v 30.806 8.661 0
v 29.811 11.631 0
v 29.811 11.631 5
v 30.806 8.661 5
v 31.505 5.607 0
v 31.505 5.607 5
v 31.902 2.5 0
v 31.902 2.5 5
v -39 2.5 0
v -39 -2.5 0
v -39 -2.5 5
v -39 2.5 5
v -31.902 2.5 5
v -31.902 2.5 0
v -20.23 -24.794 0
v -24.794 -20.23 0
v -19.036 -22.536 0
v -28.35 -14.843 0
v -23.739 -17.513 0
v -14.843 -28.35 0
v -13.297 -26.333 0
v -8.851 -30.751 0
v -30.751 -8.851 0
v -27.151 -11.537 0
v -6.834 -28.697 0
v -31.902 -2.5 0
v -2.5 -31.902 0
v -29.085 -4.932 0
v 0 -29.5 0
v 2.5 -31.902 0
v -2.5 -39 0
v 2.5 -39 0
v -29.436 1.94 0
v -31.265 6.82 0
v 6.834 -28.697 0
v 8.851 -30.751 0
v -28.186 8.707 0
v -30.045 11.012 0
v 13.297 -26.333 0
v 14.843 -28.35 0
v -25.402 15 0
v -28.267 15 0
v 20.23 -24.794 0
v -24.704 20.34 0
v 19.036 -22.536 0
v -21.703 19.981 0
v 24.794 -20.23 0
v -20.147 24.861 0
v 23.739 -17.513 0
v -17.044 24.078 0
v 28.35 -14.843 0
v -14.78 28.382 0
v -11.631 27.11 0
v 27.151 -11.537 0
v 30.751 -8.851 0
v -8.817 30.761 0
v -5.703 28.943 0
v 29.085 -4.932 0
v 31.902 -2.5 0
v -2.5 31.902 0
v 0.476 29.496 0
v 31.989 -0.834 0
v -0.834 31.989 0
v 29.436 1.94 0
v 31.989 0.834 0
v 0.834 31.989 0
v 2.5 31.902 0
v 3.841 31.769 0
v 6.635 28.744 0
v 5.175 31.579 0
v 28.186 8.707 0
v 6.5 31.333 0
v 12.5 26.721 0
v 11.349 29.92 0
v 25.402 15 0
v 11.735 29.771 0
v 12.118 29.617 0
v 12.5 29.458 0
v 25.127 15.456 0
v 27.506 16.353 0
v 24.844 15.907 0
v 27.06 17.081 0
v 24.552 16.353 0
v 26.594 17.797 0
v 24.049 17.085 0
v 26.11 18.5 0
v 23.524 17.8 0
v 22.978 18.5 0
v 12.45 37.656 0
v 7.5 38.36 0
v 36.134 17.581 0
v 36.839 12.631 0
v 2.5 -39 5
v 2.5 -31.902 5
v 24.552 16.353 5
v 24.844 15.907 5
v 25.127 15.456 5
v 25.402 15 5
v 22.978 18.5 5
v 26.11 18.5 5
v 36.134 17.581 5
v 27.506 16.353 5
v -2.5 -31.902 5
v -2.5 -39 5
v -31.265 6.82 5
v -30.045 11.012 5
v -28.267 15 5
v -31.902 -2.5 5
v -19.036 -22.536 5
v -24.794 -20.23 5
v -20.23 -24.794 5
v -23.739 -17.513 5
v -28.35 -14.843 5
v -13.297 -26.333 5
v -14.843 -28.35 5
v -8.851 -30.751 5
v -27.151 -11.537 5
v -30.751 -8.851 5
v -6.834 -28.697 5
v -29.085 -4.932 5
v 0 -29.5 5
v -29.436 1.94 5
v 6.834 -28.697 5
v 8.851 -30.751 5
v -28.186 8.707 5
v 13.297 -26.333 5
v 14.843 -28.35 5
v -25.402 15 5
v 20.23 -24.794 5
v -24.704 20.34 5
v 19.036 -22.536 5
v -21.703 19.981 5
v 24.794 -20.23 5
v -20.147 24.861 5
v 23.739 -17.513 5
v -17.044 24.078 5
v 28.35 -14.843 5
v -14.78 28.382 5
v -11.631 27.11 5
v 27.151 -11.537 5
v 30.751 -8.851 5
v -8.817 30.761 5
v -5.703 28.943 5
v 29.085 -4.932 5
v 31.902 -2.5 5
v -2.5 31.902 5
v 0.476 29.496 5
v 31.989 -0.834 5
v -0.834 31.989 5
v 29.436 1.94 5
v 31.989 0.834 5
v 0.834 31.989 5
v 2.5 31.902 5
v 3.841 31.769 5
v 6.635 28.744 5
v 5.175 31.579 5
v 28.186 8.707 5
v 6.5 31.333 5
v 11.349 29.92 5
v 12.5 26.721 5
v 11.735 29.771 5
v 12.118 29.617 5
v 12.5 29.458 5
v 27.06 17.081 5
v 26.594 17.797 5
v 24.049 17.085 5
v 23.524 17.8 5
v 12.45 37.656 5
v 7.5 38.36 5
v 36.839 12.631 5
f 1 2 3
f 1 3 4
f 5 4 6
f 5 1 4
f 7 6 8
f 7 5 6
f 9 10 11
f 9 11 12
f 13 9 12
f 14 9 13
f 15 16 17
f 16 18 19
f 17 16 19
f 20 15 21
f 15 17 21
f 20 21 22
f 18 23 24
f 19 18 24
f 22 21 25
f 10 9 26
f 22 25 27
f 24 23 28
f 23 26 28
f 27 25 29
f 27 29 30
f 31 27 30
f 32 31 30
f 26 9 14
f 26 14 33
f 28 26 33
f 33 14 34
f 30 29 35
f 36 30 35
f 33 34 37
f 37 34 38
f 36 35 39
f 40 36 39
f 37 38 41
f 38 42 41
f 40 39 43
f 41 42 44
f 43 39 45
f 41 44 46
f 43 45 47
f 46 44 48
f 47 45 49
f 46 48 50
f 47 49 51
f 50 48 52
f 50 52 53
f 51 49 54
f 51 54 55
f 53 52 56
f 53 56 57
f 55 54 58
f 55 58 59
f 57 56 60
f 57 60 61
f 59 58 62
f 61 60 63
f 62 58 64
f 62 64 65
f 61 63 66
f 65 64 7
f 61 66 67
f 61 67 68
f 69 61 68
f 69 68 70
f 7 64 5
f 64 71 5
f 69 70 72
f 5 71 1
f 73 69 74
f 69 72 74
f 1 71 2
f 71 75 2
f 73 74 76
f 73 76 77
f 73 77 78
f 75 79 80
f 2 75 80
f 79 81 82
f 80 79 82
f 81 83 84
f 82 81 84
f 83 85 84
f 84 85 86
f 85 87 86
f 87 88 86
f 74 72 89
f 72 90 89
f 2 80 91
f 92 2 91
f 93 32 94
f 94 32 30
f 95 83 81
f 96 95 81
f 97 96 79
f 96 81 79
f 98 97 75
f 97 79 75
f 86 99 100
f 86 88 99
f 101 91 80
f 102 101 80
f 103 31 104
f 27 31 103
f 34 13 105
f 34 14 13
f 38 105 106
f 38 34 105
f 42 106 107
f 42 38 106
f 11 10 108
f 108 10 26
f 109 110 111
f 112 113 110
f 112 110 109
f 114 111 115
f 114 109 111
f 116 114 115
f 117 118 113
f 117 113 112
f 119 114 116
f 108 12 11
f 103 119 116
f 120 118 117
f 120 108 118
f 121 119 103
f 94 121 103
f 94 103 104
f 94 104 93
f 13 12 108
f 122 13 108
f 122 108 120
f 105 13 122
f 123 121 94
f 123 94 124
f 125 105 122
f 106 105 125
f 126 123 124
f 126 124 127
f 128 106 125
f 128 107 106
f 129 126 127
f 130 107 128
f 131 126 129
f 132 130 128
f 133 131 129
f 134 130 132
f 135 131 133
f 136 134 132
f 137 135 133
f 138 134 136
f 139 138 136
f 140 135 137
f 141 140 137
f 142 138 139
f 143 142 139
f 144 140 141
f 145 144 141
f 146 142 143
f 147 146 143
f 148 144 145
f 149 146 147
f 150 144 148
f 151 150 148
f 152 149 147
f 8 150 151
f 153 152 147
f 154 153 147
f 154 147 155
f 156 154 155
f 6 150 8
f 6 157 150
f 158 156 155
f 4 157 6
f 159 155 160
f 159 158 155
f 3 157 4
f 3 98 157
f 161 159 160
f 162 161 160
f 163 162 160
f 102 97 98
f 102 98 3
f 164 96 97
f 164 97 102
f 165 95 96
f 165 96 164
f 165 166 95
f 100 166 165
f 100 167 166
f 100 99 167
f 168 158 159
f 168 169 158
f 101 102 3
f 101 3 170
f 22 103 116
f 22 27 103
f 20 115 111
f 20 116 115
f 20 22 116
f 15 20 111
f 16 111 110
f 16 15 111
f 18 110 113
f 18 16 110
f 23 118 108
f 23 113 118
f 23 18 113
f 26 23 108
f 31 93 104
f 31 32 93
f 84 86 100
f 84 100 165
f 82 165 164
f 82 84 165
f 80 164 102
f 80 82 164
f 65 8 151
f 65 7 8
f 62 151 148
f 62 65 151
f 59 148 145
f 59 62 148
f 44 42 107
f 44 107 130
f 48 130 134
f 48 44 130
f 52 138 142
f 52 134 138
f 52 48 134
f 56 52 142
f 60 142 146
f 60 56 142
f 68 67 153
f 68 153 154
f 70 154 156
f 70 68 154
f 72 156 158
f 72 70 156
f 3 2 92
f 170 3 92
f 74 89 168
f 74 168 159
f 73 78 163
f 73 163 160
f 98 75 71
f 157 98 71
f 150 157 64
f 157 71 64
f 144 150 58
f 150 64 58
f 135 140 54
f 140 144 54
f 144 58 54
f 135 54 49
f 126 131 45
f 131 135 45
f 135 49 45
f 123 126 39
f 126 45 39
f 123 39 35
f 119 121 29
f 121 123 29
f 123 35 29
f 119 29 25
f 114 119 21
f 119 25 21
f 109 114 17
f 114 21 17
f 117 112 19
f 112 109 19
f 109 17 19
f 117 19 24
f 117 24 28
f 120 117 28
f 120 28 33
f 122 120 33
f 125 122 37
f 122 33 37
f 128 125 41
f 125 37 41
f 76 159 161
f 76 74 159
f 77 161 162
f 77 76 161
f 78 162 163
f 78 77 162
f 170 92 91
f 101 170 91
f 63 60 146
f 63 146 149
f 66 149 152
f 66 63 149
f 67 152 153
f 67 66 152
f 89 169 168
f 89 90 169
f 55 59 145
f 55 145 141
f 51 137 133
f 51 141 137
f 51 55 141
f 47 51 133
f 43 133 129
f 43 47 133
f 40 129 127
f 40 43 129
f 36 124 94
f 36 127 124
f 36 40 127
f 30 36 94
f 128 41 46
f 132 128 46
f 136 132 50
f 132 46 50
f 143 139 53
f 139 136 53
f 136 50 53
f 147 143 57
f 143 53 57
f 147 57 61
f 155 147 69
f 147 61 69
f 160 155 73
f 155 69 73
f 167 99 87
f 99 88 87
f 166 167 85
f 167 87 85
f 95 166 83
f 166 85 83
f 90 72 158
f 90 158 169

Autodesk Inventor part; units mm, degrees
ref_plane "YZ Plane" through (0, 0, 0) normal (1, 0, 0) x (0, 1, 0)
ref_plane "XZ Plane" through (0, 0, 0) normal (0, 1, 0) x (-1, 0, 0)
ref_plane "XY Plane" through (0, 0, 0) normal (0, 0, 1) x (1, 0, 0)
sketch "Sketch1" plane through (0, 0, 0) normal (0, 0, 1) x (1, 0, 0)
  arc A0 (-25.4018, 15) -> (25.4018, 15) centre (0, 0) ccw
  line L0 (-39, 2.5) -> (-32, 2.5)
  line L1 (-32, -2.5) -> (-39, -2.5)
  line L2 (-39, -2.5) -> (-39, 2.5)
  line L3 (-32, 2.5) -> (-31.9022, 2.5)
  line L4 (-32, -2.5) -> (-31.9022, -2.5)
  line L5 (2.5, -32) -> (2.5, -39)
  line L6 (2.5, -39) -> (-2.5, -39)
  line L7 (-2.5, -39) -> (-2.5, -32)
  line L8 (-2.5, -32) -> (-2.5, -31.9022)
  line L9 (2.5, -32) -> (2.5, -31.9022)
  line L10 (32, 2.5) -> (31.9022, 2.5)
  line L11 (32, -2.5) -> (31.9022, -2.5)
  arc A1 (-28.2666, 15) -> (-31.9022, 2.5) centre (0, 0) ccw
  arc A2 (-31.9022, -2.5) -> (-2.5, -31.9022) centre (0, 0) ccw
  arc A3 (2.5, -31.9022) -> (31.9022, -2.5) centre (0, 0) ccw
  arc A4 (31.9022, 2.5) -> (28.2666, 15) centre (0, 0) ccw
  arc A5 (12.5, 26.7208) -> (25.4018, 15) centre (0, 0) ccw
  line L12 (12.5, 29.4576) -> (12.5, 26.7208)
  arc A6 (-2.5, 31.9022) -> (-31.9022, 2.5) centre (0, 0) ccw
  arc A7 (-31.9022, -2.5) -> (-2.5, -31.9022) centre (0, 0) ccw
  arc A8 (2.5, -31.9022) -> (31.9022, -2.5) centre (0, 0) ccw
  arc A9 (31.9022, 2.5) -> (28.2666, 15) centre (0, 0) ccw
  line L13 (6.5, 31.3329) -> (7.5001, 38.3601)
  line L14 (6.5, 31.3329) -> (13.598, 31.3329) construction
  line L15 (7.5001, 38.3601) -> (12.4502, 37.6556)
  line L16 (12.4502, 37.6556) -> (11.3493, 29.9198)
  arc A10 (12.5, 29.4576) -> (11.3493, 29.9198) centre (0, 0) ccw
  arc A11 (12.5, 29.4576) -> (11.3493, 29.9198) centre (0, 0) ccw
  arc A12 (6.5, 31.3329) -> (2.5, 31.9022) centre (0, 0) ccw
  arc A13 (6.5, 31.3329) -> (-31.9022, 2.5) centre (0, 0) ccw
  arc A14 (31.9022, 2.5) -> (28.2666, 15) centre (0, 0) ccw
  arc A15 (-31.9022, -2.5) -> (-2.5, -31.9022) centre (0, 0) ccw
  arc A16 (2.5, -31.9022) -> (31.9022, -2.5) centre (0, 0) ccw
  line L17 (31.9022, 2.5) -> (41.0332, 2.5) construction
  line L18 (29.8114, 11.631) -> (36.8386, 12.6311)
  line L19 (29.8114, 11.631) -> (36.9094, 11.631) construction
  line L20 (36.8386, 12.6311) -> (41.8386, 12.6311) construction
  line L21 (36.8386, 12.6311) -> (36.1341, 17.5812)
  line L22 (36.8386, 12.6311) -> (41.8386, 12.6311) construction
  line L23 (36.1341, 17.5812) -> (27.5058, 16.3533)
  line L24 (36.1341, 17.5812) -> (44.8493, 17.5812) construction
  arc A17 (12.5, 26.7208) -> (24.5524, 16.3533) centre (0, 0) ccw
  arc A18 (12.5, 29.4576) -> (11.3493, 29.9198) centre (0, 0) ccw
  arc A19 (2.5, -31.9022) -> (27.5058, 16.3533) centre (0, 0) ccw
  arc A20 (6.5, 31.3329) -> (-31.9022, 2.5) centre (0, 0) ccw
  arc A21 (-31.9022, -2.5) -> (-2.5, -31.9022) centre (0, 0) ccw
  arc A22 (12.5, 26.7208) -> (22.9783, 18.5) centre (0, 0) ccw
  line L25 (28.2666, 15) -> (31.7666, 15) construction
  line L26 (22.9783, 18.5) -> (26.1103, 18.5)
  arc A23 (12.5, 29.4576) -> (11.3493, 29.9198) centre (0, 0) ccw
  arc A24 (6.5, 31.3329) -> (-31.9022, 2.5) centre (0, 0) ccw
  arc A25 (-31.9022, -2.5) -> (-2.5, -31.9022) centre (0, 0) ccw
  arc A26 (2.5, -31.9022) -> (26.1103, 18.5) centre (0, 0) ccw
  point P0 (11.5, 29.8622)
  point P1 (2.5, 31.9022)
  point P2 (24.5524, 16.3533)
  point P3 (25.4018, 15)
  dimension "d78" = 7.098
  dimension "d79" = 81.9
  dimension "d80" = 5
  dimension "d81" = 90
  dimension "d82" = 90
  dimension "d89" = 7.098
  dimension "d90" = 8.1
  dimension "d93" = 5
  dimension "d94" = 98.1
  dimension "d95" = 171.9
extrude "Extrusion7" add sketch "Sketch1" along normal blind 5
properties part number "Clip_TestFitV1"
